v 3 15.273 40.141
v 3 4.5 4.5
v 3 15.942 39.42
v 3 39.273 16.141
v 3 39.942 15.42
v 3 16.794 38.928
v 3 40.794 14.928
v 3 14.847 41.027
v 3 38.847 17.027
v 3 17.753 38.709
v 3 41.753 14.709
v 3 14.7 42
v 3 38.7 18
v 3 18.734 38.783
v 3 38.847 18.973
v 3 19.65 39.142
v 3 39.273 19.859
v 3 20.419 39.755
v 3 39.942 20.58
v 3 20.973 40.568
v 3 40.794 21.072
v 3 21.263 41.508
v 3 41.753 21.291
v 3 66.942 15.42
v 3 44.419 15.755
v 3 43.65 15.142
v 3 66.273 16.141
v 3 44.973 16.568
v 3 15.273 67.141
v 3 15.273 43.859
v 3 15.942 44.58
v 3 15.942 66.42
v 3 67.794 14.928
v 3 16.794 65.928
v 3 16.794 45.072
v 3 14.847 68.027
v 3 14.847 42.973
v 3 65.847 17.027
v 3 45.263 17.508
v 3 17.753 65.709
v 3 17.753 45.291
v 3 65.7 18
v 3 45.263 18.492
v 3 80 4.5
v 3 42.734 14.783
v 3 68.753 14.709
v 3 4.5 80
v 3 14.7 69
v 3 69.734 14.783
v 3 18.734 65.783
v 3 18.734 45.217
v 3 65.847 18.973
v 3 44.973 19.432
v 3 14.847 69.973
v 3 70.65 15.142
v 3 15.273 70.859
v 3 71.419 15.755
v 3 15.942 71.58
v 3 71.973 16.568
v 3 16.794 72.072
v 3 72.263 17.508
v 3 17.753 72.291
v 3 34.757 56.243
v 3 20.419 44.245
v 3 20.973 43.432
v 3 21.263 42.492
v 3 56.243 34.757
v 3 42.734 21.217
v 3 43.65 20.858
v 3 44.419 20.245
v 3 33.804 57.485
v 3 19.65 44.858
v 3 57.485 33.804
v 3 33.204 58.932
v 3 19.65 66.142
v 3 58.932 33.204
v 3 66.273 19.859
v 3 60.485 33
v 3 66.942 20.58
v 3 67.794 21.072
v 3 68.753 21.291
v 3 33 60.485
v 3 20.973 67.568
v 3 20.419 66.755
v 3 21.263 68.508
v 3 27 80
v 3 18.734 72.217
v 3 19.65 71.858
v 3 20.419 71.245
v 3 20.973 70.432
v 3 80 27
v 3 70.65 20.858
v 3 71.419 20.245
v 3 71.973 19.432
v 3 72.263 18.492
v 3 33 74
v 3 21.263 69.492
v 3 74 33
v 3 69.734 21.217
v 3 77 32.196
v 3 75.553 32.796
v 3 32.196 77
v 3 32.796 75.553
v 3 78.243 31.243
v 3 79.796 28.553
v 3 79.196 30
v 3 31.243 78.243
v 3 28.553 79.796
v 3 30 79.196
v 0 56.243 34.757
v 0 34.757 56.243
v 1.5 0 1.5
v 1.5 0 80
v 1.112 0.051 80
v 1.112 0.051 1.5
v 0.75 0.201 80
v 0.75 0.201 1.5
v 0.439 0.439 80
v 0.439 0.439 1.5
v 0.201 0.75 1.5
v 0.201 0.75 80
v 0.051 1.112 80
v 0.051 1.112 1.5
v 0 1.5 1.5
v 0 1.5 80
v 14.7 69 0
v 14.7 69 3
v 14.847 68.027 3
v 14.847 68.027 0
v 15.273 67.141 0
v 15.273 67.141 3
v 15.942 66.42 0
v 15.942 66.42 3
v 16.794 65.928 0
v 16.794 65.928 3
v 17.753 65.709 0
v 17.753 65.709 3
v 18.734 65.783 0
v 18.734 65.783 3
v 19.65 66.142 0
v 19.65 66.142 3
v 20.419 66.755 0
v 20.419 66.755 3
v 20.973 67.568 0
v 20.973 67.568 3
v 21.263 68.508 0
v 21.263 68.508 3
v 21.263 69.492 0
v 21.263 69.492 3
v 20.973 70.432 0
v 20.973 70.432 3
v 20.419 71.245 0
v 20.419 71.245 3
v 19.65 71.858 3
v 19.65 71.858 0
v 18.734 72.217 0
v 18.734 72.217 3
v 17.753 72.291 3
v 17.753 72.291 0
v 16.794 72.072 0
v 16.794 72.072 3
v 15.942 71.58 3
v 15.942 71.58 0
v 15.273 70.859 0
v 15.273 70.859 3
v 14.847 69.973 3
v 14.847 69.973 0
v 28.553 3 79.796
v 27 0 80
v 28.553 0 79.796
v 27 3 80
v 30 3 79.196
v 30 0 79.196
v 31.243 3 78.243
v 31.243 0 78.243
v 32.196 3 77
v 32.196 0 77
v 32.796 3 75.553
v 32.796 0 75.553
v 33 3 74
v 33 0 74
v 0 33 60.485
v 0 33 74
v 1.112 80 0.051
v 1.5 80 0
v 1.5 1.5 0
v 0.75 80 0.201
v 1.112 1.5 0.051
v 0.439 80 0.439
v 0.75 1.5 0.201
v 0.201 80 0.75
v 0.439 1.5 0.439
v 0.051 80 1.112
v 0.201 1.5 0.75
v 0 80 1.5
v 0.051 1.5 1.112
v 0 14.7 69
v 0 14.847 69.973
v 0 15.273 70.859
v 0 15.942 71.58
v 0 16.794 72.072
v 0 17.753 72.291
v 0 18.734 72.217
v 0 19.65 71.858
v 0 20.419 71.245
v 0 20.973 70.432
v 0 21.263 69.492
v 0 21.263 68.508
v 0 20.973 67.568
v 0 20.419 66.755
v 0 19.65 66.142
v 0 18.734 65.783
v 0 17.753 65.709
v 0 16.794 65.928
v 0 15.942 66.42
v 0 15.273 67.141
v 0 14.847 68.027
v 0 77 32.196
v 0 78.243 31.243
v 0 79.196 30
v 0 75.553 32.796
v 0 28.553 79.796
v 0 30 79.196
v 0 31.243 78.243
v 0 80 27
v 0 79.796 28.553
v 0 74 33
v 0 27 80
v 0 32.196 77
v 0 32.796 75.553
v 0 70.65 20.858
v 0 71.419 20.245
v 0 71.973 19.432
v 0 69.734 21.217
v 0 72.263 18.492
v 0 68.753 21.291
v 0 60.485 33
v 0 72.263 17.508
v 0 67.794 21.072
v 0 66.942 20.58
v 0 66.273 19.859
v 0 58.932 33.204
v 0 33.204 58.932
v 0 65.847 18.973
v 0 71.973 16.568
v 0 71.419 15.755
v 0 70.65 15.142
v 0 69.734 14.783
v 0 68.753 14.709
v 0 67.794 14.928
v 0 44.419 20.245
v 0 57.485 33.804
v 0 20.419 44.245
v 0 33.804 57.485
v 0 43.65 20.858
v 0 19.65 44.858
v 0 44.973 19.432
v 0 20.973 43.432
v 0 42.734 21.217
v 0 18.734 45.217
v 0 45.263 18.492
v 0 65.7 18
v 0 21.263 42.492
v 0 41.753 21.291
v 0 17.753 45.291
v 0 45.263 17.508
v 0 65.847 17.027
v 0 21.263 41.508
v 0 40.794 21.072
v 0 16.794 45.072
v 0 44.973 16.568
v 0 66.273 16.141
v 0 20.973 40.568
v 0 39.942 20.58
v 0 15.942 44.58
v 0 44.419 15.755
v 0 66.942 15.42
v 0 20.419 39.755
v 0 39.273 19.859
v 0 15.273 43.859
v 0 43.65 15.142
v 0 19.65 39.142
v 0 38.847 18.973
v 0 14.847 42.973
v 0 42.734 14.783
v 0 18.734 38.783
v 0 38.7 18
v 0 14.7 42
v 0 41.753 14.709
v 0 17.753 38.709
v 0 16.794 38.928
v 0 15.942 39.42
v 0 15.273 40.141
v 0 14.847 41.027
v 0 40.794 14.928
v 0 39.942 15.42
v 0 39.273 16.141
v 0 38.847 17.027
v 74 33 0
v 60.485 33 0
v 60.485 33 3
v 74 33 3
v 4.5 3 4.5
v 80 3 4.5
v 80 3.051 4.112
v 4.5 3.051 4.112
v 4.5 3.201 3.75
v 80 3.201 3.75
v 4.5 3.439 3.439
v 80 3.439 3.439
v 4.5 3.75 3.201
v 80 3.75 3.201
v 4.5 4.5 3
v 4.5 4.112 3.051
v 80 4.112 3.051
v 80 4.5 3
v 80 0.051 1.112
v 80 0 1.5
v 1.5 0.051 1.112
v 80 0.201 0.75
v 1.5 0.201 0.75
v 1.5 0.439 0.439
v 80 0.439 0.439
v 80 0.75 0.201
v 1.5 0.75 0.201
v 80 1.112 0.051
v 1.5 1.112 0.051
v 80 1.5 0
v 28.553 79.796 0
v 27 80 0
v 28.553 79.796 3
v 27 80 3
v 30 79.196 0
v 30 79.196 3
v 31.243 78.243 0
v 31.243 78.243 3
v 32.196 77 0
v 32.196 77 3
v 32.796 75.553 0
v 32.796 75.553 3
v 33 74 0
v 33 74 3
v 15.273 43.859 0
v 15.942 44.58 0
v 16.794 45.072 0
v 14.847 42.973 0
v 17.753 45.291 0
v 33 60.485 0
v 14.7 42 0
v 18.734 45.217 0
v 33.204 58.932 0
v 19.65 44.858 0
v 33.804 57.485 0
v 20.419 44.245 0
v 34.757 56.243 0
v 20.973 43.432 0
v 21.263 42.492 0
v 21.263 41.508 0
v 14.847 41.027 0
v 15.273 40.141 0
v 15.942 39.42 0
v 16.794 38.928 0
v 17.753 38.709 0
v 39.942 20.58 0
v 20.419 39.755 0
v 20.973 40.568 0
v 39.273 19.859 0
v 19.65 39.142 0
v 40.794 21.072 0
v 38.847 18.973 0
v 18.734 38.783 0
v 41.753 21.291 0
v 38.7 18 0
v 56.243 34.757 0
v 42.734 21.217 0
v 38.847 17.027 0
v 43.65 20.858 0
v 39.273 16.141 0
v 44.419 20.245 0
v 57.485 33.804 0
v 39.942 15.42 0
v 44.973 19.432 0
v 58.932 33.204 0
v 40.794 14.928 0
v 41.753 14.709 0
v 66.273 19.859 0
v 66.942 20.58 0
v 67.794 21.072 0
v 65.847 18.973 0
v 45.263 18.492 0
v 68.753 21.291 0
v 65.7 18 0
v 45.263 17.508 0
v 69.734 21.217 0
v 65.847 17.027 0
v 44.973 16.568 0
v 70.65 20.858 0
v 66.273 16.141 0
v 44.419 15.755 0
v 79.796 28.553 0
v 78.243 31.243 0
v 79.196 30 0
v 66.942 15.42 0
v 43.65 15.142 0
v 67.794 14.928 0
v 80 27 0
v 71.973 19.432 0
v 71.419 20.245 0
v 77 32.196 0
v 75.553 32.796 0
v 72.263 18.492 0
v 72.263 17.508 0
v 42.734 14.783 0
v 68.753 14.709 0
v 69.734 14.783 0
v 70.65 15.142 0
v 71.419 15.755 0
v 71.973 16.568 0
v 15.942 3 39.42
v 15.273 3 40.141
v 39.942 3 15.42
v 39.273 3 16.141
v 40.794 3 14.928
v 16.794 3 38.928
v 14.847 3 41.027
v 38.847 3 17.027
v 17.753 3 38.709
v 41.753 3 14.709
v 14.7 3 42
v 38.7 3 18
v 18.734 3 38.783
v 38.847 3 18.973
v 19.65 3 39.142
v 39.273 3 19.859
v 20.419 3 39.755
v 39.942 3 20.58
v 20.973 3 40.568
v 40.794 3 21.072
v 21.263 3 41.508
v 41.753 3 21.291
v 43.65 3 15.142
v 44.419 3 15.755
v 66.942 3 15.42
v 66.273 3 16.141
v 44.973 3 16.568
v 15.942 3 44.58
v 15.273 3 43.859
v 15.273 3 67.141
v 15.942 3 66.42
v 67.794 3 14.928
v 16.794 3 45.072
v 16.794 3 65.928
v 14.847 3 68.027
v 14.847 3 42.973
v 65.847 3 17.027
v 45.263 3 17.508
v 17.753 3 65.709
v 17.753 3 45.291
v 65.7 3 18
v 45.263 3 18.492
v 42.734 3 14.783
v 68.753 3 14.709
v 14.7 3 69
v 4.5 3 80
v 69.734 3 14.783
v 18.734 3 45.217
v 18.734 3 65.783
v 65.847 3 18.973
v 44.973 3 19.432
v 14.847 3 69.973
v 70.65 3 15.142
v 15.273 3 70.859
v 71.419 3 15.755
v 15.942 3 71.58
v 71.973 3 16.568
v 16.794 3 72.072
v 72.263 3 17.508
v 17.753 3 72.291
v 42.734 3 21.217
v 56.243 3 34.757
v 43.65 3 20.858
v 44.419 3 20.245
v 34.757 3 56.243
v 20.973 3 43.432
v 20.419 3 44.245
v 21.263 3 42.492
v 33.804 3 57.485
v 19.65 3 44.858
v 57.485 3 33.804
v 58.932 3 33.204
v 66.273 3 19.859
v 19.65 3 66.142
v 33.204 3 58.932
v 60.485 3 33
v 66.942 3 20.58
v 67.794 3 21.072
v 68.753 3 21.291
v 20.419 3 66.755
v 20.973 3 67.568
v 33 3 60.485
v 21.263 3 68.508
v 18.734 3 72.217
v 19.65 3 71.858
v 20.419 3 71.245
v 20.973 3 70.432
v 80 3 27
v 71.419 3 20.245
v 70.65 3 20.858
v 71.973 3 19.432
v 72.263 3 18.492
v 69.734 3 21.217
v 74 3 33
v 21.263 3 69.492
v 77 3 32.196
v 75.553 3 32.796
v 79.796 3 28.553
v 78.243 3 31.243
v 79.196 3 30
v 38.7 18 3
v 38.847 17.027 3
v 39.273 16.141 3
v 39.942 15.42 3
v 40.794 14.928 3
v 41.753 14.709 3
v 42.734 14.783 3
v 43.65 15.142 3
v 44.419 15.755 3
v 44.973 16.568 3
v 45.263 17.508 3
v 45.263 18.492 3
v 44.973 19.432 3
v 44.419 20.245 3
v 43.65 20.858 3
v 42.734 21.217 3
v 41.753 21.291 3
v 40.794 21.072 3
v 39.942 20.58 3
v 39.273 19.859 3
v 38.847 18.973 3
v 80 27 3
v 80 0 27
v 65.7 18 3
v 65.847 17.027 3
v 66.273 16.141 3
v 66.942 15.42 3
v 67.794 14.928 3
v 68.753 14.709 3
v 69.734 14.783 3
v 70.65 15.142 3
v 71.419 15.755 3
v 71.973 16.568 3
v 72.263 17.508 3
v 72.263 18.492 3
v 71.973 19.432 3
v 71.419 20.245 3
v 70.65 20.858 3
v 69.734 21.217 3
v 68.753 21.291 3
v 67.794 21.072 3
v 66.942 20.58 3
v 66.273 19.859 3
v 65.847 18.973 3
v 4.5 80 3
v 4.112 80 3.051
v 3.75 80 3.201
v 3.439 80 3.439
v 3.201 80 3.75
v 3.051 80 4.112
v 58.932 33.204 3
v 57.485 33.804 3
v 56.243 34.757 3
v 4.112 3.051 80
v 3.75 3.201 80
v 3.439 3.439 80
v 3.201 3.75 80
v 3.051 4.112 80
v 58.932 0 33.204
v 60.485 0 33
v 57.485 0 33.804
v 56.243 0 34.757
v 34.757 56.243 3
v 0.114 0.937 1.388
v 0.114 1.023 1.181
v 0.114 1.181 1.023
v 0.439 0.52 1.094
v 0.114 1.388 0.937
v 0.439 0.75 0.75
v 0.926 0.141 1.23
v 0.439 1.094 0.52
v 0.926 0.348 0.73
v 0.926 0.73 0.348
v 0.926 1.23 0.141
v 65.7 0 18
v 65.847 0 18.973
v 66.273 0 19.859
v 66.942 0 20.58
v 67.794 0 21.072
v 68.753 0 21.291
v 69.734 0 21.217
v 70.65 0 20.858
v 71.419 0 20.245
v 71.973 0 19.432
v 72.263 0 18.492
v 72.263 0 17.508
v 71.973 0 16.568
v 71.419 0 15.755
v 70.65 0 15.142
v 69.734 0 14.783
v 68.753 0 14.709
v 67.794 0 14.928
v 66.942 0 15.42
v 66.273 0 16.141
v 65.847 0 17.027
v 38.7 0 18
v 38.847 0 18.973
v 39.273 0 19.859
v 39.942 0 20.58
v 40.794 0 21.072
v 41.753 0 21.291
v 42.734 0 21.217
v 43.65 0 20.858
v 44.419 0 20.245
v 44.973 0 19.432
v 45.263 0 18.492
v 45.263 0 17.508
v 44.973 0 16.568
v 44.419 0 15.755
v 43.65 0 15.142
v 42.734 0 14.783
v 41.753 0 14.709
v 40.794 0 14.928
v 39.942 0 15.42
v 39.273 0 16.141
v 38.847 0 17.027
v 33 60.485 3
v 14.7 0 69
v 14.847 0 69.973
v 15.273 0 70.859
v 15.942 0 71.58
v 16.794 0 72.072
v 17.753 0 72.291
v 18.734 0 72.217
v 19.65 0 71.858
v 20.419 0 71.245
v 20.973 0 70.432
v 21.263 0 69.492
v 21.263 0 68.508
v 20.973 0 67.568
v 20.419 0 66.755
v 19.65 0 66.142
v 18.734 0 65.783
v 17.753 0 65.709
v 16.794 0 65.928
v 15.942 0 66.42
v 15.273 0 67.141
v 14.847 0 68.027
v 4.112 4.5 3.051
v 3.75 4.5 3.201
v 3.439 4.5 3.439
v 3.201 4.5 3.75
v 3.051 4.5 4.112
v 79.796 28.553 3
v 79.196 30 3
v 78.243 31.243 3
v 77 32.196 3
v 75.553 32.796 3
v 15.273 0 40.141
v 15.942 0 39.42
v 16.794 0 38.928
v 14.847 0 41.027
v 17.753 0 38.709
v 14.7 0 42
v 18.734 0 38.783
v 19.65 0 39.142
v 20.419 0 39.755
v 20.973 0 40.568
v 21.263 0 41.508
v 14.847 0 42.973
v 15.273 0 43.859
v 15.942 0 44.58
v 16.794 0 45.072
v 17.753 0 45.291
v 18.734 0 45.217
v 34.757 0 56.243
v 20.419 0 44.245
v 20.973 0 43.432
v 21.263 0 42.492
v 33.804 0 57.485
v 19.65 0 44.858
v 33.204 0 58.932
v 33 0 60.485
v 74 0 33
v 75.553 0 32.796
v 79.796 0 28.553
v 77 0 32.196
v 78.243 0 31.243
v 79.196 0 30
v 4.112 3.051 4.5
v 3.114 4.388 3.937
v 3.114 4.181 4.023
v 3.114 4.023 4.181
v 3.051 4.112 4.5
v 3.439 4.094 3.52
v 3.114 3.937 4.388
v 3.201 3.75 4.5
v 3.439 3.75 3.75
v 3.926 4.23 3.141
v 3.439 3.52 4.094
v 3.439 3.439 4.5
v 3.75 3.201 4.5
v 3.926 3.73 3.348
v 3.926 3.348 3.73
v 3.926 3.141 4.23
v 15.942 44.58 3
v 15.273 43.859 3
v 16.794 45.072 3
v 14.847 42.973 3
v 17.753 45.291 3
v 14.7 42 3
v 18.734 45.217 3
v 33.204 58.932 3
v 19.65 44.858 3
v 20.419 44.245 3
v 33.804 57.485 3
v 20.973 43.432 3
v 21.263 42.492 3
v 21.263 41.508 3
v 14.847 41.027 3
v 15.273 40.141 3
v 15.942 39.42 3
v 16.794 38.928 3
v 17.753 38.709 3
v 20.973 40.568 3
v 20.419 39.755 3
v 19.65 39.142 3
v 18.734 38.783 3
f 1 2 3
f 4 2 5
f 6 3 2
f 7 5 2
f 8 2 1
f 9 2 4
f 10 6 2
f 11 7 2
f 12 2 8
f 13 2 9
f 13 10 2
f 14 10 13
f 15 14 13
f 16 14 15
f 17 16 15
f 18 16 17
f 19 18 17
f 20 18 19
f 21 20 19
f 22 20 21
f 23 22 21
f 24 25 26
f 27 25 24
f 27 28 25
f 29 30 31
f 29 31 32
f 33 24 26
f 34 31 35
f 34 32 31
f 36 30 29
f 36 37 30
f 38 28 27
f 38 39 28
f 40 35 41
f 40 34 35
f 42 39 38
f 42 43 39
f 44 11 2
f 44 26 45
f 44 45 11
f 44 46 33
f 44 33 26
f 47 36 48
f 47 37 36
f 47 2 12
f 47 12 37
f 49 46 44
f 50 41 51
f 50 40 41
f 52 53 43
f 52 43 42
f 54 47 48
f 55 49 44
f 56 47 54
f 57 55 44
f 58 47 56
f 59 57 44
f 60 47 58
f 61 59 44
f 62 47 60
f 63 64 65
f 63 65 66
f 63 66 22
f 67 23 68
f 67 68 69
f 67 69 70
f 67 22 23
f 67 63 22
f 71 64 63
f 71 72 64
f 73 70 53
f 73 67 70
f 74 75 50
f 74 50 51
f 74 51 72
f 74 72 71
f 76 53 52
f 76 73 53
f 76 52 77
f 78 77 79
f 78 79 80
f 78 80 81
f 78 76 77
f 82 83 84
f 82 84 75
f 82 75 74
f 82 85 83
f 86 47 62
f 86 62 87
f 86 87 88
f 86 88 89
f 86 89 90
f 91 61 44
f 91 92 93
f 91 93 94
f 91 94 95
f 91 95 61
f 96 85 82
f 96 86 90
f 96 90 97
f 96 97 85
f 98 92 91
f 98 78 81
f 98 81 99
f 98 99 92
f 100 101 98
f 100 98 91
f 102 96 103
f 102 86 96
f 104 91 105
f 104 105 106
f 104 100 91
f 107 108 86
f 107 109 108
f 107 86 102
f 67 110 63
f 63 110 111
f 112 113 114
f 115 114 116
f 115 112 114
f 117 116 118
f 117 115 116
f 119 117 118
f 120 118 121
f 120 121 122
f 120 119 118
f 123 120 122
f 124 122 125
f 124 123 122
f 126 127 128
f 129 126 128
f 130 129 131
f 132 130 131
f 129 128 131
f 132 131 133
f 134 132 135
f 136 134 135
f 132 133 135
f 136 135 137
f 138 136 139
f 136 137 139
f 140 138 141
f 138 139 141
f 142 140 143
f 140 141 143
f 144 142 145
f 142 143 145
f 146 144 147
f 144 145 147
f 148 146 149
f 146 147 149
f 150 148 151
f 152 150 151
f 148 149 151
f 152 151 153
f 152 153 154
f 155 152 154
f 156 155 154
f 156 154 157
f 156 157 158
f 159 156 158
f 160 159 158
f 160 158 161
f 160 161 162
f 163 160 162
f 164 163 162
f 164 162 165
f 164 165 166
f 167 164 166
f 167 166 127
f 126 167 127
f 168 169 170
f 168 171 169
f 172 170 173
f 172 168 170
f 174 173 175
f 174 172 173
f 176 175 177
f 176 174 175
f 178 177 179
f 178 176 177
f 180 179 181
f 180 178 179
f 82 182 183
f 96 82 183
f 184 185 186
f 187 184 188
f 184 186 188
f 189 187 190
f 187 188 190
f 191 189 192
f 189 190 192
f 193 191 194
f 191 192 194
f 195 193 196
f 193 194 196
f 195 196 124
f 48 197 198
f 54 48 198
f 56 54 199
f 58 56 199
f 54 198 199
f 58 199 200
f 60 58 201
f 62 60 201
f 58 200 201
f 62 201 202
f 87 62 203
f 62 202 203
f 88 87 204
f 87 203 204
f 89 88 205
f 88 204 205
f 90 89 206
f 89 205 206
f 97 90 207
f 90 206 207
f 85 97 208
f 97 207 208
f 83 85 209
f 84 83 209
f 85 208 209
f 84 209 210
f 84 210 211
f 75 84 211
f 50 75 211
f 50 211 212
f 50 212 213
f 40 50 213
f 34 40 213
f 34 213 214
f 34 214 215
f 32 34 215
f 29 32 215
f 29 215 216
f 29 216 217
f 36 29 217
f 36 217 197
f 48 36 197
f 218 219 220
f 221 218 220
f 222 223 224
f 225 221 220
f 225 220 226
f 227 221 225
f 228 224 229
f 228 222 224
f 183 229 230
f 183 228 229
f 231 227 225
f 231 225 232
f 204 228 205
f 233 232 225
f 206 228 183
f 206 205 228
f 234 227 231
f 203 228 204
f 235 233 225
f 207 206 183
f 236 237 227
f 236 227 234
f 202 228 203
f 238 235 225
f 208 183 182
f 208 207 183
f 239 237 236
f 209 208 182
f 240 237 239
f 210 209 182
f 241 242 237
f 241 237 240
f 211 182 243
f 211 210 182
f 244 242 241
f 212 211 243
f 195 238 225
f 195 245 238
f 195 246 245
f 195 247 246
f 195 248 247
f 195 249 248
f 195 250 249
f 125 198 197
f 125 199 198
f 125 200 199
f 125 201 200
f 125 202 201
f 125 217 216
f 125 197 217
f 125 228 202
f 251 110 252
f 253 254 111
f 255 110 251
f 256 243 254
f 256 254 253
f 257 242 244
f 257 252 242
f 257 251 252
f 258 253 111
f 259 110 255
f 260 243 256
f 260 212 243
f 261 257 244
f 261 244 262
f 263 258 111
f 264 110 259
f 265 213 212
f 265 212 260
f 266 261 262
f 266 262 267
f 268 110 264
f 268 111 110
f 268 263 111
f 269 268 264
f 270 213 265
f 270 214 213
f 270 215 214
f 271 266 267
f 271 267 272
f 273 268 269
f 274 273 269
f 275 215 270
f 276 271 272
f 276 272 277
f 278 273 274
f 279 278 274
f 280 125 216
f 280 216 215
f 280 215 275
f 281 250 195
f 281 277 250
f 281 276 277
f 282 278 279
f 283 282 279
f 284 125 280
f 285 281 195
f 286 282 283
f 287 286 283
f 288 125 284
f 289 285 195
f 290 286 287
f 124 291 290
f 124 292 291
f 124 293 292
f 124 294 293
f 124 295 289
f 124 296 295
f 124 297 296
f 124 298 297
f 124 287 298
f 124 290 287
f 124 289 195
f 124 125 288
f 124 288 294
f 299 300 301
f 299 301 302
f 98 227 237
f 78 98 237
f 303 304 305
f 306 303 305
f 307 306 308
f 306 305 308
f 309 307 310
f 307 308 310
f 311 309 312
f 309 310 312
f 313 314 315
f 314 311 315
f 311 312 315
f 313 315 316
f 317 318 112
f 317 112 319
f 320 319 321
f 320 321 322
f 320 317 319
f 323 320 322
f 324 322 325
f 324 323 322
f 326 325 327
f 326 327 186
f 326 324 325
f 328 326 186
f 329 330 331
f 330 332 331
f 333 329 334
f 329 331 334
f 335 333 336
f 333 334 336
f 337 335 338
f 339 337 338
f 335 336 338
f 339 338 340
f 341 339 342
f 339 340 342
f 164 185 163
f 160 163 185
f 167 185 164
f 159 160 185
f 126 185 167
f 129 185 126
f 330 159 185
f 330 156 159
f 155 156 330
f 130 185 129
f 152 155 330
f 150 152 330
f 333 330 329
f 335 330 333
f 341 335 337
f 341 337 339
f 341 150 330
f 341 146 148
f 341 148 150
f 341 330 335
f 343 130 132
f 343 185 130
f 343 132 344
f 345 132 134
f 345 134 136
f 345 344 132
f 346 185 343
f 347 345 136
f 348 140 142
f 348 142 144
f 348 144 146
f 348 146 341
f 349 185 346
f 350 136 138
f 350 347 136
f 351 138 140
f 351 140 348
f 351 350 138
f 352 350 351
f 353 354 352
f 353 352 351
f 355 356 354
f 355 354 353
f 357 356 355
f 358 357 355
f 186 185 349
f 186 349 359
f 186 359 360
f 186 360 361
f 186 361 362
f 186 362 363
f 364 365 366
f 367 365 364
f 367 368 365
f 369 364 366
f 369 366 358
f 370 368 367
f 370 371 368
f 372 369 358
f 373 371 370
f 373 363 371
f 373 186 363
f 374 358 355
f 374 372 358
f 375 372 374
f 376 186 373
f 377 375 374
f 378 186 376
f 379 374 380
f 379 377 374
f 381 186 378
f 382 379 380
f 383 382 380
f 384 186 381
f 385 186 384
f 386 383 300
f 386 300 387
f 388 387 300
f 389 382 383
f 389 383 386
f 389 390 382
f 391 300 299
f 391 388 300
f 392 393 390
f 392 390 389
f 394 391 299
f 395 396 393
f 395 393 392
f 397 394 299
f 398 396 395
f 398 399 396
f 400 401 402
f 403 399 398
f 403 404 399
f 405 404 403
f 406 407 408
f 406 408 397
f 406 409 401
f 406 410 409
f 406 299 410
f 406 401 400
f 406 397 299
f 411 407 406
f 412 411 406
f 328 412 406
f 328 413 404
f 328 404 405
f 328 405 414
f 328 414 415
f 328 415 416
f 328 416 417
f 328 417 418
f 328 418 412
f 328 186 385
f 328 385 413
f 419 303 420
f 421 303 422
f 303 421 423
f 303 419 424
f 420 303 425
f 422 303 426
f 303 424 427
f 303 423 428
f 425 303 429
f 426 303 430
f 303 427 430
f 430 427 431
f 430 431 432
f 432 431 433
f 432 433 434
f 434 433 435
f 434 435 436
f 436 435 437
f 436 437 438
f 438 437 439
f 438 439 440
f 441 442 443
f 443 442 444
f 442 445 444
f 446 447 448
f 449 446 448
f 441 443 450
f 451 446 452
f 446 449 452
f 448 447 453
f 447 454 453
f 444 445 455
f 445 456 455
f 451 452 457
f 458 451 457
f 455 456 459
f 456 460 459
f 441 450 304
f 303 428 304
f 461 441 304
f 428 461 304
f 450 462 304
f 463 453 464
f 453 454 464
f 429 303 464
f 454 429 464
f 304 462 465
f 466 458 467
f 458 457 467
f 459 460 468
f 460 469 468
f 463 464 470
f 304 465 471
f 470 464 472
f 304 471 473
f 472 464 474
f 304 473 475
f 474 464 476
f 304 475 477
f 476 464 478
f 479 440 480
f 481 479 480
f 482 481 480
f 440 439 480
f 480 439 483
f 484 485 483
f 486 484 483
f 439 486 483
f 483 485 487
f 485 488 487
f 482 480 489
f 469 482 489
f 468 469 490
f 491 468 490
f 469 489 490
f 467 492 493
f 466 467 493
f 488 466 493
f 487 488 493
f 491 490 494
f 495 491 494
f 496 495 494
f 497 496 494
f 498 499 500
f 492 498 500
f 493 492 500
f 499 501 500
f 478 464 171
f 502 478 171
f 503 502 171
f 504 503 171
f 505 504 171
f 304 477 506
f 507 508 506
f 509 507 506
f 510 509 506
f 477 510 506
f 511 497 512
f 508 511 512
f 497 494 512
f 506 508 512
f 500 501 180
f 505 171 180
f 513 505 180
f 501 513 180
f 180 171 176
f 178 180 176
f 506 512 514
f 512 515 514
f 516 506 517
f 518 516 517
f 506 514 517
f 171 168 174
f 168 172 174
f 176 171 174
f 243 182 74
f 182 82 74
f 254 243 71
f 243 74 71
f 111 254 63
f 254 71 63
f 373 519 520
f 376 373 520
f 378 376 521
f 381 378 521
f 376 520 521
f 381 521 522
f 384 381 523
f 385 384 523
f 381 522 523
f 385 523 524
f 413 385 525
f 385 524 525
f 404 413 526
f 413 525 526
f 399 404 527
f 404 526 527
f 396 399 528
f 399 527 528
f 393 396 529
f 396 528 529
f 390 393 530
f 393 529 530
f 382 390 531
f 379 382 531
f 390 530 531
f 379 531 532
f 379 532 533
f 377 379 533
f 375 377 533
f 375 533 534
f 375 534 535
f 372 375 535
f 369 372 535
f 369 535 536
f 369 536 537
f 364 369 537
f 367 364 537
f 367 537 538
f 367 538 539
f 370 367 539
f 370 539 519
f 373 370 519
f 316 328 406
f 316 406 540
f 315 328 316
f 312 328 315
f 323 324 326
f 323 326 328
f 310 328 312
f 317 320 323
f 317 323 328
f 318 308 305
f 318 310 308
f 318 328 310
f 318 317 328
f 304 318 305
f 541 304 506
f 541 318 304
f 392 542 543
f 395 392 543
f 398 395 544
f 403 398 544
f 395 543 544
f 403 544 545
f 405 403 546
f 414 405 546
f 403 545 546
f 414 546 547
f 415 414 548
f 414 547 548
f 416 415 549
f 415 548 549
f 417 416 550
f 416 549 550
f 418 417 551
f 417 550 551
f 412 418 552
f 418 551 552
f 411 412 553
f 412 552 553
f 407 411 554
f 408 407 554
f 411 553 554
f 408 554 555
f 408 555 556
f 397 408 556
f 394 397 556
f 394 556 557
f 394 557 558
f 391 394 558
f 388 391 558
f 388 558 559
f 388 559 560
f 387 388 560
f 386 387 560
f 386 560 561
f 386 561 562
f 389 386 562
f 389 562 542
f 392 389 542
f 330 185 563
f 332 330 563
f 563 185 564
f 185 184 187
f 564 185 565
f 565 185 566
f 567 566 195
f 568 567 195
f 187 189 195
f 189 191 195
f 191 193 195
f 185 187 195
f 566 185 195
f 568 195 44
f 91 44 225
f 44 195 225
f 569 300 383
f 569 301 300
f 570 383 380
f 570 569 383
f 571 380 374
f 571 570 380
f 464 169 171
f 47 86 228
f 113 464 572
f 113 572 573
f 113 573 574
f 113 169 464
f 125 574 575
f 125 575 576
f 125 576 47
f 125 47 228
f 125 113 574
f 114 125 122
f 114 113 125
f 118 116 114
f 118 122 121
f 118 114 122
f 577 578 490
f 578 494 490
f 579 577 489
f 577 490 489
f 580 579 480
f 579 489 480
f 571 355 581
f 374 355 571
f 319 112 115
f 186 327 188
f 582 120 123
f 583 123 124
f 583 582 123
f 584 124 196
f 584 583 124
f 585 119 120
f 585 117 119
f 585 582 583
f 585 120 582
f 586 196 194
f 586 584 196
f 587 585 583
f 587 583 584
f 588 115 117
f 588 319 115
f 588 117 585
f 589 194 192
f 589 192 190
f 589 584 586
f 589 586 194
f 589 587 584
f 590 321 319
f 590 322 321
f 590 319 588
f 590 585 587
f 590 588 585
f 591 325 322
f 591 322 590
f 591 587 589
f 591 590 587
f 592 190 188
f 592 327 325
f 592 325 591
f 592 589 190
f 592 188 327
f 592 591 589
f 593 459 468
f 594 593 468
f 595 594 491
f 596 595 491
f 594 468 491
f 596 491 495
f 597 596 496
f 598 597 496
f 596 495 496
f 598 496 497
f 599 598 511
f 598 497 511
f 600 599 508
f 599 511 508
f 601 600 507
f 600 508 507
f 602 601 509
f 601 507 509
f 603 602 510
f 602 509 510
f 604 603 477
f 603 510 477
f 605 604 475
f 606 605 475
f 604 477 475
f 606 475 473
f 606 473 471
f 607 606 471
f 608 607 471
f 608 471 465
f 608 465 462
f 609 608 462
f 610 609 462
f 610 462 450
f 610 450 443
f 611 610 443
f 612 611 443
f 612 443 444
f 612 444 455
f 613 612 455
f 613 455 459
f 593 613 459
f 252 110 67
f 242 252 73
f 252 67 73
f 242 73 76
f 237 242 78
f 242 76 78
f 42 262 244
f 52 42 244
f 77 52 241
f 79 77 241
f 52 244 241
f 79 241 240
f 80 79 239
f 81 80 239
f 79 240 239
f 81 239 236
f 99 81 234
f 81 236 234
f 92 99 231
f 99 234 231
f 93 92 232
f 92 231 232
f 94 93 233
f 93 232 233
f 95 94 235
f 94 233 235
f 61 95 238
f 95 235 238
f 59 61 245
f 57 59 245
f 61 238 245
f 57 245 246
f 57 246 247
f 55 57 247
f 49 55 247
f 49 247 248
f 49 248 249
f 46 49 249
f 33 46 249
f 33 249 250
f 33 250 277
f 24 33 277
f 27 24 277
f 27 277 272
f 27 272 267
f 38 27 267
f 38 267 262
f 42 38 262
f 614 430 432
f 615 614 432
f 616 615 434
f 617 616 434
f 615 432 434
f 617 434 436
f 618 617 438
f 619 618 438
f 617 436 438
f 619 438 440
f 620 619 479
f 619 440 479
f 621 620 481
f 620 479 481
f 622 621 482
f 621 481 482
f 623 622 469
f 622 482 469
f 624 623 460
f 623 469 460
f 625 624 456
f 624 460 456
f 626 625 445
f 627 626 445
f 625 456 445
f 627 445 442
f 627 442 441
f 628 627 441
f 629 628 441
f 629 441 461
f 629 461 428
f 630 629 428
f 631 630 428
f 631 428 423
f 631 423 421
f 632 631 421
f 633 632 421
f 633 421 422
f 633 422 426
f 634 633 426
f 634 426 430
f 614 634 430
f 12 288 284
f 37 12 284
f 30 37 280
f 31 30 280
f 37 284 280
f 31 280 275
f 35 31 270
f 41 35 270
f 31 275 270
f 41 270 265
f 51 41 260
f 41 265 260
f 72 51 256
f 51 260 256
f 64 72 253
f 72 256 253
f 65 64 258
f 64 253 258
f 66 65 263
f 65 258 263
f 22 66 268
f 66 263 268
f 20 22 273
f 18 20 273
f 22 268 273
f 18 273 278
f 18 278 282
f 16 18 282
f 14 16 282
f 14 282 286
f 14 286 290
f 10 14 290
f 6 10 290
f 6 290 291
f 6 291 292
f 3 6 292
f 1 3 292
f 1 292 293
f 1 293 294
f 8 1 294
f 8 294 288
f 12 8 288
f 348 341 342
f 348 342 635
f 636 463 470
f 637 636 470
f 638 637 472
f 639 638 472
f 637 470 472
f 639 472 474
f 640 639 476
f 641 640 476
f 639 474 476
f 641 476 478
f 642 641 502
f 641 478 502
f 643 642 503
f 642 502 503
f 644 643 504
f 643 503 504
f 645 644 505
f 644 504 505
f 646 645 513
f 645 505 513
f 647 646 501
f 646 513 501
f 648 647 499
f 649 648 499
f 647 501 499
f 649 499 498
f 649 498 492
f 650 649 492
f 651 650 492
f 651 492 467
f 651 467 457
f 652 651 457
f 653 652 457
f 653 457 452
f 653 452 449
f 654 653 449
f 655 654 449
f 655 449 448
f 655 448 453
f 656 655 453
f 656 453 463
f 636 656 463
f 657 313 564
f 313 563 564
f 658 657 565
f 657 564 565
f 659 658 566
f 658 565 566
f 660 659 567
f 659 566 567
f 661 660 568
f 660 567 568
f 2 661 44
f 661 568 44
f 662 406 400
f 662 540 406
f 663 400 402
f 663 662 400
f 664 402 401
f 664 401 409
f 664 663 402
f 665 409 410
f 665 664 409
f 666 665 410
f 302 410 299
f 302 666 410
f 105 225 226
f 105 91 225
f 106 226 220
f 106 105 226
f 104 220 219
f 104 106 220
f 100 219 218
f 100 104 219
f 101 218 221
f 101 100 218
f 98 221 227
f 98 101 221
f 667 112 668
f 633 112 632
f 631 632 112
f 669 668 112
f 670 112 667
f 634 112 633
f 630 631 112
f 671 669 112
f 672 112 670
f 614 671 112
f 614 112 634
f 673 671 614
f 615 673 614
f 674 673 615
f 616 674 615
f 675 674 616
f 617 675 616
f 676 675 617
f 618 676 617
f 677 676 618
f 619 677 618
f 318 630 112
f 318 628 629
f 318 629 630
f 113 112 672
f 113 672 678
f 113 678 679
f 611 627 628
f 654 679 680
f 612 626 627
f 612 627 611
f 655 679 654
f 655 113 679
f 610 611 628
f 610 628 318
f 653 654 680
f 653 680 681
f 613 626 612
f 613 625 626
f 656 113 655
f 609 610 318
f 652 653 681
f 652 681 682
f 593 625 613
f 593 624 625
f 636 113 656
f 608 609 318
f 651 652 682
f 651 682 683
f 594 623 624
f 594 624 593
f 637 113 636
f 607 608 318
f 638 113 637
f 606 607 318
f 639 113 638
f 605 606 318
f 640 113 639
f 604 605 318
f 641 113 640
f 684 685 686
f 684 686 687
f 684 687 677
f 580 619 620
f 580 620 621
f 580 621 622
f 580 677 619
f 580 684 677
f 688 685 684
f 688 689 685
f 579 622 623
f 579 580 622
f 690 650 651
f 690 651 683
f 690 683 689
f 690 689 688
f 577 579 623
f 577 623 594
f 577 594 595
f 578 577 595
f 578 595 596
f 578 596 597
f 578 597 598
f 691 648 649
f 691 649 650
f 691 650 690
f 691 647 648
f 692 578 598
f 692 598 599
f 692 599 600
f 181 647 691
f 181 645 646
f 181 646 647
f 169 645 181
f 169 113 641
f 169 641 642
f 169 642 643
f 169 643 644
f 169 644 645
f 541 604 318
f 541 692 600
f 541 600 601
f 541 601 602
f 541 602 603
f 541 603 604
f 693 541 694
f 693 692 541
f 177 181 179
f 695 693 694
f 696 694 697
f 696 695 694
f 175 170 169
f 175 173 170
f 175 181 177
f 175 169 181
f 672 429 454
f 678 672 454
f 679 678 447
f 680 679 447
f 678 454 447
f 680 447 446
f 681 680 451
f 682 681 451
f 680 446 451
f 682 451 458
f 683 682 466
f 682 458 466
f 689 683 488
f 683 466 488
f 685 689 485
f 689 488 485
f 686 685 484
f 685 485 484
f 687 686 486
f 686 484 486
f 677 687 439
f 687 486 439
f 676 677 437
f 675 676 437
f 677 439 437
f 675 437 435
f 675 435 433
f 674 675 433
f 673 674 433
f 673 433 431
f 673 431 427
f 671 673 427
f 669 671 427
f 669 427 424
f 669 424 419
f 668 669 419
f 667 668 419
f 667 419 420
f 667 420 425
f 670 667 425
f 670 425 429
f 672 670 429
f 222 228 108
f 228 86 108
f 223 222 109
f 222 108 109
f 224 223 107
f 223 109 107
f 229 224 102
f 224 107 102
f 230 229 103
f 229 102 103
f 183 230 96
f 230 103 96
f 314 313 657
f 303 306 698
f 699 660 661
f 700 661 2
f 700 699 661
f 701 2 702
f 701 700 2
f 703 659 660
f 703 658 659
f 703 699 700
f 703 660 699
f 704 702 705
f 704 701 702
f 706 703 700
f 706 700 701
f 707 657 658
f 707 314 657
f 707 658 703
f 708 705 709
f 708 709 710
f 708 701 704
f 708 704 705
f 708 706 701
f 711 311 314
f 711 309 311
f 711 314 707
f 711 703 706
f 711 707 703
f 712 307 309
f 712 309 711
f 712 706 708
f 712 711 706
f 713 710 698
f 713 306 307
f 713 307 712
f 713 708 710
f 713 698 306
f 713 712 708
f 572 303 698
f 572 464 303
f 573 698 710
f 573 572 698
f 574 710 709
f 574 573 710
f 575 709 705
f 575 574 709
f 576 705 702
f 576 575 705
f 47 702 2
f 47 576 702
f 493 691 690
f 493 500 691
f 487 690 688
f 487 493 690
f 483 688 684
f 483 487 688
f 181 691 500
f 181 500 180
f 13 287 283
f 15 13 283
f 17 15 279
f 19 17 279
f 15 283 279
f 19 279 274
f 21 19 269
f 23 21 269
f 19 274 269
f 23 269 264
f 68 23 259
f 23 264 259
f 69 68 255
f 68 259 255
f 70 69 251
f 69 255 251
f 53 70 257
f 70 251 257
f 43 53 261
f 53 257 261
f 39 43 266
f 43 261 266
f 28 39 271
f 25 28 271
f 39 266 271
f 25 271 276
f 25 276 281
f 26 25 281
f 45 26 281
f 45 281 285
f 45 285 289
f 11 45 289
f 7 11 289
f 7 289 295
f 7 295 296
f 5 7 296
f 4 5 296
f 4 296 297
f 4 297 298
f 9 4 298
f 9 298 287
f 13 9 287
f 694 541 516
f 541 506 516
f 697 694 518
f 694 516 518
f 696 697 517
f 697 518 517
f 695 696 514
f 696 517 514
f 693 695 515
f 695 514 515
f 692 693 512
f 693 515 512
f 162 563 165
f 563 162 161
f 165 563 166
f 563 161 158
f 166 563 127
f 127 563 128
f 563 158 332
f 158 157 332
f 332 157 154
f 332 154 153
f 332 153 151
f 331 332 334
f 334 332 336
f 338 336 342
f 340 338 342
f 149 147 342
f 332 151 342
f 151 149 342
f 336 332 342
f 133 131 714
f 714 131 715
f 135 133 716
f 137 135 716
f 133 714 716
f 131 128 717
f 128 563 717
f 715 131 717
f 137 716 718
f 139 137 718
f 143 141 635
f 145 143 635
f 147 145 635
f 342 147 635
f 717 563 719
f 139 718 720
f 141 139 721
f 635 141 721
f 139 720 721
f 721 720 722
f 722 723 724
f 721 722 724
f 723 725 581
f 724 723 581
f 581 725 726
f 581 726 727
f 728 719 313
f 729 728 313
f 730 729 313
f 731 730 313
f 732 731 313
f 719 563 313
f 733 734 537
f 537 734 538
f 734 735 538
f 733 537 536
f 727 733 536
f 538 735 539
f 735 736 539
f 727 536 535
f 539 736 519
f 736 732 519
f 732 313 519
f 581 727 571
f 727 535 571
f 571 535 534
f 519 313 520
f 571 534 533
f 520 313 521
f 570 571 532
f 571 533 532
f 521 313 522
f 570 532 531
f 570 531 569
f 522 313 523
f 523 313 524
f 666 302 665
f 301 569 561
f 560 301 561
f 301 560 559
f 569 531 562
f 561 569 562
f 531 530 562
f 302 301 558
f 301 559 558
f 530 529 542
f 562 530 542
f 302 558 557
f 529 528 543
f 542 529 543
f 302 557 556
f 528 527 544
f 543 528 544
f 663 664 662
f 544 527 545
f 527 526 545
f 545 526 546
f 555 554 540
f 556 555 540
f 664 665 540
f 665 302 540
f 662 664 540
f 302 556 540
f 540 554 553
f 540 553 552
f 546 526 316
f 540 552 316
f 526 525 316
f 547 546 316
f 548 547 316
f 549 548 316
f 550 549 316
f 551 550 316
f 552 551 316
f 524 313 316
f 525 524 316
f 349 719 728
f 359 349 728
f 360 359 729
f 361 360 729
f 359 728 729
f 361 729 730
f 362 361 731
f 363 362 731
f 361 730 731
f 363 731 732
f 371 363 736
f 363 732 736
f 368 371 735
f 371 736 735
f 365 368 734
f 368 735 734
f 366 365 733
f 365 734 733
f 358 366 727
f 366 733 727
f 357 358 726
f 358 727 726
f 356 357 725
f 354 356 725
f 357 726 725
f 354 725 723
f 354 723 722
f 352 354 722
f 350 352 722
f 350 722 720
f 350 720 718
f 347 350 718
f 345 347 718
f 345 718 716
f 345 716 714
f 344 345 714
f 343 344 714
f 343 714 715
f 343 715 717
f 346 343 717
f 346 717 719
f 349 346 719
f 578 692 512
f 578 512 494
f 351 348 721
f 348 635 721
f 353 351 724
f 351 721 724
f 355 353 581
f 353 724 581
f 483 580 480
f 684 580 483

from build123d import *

# Parameters (mm, degrees)
F1_DEPTH = 3
F3_DEPTH = 3
F5_DEPTH = 3
F7_D     = 6.6
F9_D     = 6.6
F11_D    = 6.6
F12_R    = 6
F13_R    = 1.5


with BuildPart() as f1:
    # F0 (on Front) → F1 (new body)
    with BuildSketch(Plane.XZ):
        Polygon((33, 80), (0, 80), (0, 0), (80, 0), (80, 33), (58, 33), (33, 58), align=None)
    extrude(amount=-F1_DEPTH)

    # F2 (on Right) → F3 (join)
    with BuildSketch(Plane.YZ):
        Polygon((0, 80), (0, 0), (80, 0), (80, 33), (58, 33), (33, 58), (33, 80), align=None)
    extrude(amount=F3_DEPTH)

    # F4 (on face) → F5 (join)
    with BuildSketch(Plane(origin=(0, 0, 0), x_dir=(1, 0, 0), z_dir=(0, 0, -1))):
        Polygon((80, 0), (0, 0), (0, -80), (33, -80), (33, -58), (58, -33), (80, -33), align=None)
    extrude(amount=-F5_DEPTH)

    # F7 (through all)
    with Locations(Plane.XZ):
        with Locations((42, 18), (69, 18), (18, 69), (18, 42)):
            Hole(F7_D / 2)

    # F9 (through all)
    with Locations(Plane.YZ.offset(3)):
        with Locations((42, 18), (69, 18), (18, 69), (18, 42)):
            Hole(F9_D / 2)

    # F11 (through all)
    with Locations(Plane(origin=(0, 0, 0), x_dir=(1, 0, 0), z_dir=(0, 0, -1))):
        with Locations((42, -18), (69, -18), (18, -42), (18, -69)):
            Hole(F11_D / 2)

    # F12
    f12_edges = [f1.edges().sort_by_distance(p)[0] for p in [
        (33, 1.5, 80),
        (1.5, 80, 33),
        (80, 1.5, 33),
        (33, 1.5, 58),
        (58, 1.5, 33),
        (58, 33, 1.5),
        (33, 58, 1.5),
        (1.5, 58, 33),
        (1.5, 33, 58),
        (1.5, 33, 80),
        (33, 80, 1.5),
        (80, 33, 1.5),
    ]]
    fillet(f12_edges, radius=F12_R)

    # F13
    f13_edges = [f1.edges().sort_by_distance(p)[0] for p in [
        (41.5, 3, 3),
        (3, 41.5, 3),
        (3, 3, 41.5),
        (40, 0, 0),
        (0, 0, 40),
        (0, 40, 0),
    ]]
    fillet(f13_edges, radius=F13_R)


solid = f1.part
